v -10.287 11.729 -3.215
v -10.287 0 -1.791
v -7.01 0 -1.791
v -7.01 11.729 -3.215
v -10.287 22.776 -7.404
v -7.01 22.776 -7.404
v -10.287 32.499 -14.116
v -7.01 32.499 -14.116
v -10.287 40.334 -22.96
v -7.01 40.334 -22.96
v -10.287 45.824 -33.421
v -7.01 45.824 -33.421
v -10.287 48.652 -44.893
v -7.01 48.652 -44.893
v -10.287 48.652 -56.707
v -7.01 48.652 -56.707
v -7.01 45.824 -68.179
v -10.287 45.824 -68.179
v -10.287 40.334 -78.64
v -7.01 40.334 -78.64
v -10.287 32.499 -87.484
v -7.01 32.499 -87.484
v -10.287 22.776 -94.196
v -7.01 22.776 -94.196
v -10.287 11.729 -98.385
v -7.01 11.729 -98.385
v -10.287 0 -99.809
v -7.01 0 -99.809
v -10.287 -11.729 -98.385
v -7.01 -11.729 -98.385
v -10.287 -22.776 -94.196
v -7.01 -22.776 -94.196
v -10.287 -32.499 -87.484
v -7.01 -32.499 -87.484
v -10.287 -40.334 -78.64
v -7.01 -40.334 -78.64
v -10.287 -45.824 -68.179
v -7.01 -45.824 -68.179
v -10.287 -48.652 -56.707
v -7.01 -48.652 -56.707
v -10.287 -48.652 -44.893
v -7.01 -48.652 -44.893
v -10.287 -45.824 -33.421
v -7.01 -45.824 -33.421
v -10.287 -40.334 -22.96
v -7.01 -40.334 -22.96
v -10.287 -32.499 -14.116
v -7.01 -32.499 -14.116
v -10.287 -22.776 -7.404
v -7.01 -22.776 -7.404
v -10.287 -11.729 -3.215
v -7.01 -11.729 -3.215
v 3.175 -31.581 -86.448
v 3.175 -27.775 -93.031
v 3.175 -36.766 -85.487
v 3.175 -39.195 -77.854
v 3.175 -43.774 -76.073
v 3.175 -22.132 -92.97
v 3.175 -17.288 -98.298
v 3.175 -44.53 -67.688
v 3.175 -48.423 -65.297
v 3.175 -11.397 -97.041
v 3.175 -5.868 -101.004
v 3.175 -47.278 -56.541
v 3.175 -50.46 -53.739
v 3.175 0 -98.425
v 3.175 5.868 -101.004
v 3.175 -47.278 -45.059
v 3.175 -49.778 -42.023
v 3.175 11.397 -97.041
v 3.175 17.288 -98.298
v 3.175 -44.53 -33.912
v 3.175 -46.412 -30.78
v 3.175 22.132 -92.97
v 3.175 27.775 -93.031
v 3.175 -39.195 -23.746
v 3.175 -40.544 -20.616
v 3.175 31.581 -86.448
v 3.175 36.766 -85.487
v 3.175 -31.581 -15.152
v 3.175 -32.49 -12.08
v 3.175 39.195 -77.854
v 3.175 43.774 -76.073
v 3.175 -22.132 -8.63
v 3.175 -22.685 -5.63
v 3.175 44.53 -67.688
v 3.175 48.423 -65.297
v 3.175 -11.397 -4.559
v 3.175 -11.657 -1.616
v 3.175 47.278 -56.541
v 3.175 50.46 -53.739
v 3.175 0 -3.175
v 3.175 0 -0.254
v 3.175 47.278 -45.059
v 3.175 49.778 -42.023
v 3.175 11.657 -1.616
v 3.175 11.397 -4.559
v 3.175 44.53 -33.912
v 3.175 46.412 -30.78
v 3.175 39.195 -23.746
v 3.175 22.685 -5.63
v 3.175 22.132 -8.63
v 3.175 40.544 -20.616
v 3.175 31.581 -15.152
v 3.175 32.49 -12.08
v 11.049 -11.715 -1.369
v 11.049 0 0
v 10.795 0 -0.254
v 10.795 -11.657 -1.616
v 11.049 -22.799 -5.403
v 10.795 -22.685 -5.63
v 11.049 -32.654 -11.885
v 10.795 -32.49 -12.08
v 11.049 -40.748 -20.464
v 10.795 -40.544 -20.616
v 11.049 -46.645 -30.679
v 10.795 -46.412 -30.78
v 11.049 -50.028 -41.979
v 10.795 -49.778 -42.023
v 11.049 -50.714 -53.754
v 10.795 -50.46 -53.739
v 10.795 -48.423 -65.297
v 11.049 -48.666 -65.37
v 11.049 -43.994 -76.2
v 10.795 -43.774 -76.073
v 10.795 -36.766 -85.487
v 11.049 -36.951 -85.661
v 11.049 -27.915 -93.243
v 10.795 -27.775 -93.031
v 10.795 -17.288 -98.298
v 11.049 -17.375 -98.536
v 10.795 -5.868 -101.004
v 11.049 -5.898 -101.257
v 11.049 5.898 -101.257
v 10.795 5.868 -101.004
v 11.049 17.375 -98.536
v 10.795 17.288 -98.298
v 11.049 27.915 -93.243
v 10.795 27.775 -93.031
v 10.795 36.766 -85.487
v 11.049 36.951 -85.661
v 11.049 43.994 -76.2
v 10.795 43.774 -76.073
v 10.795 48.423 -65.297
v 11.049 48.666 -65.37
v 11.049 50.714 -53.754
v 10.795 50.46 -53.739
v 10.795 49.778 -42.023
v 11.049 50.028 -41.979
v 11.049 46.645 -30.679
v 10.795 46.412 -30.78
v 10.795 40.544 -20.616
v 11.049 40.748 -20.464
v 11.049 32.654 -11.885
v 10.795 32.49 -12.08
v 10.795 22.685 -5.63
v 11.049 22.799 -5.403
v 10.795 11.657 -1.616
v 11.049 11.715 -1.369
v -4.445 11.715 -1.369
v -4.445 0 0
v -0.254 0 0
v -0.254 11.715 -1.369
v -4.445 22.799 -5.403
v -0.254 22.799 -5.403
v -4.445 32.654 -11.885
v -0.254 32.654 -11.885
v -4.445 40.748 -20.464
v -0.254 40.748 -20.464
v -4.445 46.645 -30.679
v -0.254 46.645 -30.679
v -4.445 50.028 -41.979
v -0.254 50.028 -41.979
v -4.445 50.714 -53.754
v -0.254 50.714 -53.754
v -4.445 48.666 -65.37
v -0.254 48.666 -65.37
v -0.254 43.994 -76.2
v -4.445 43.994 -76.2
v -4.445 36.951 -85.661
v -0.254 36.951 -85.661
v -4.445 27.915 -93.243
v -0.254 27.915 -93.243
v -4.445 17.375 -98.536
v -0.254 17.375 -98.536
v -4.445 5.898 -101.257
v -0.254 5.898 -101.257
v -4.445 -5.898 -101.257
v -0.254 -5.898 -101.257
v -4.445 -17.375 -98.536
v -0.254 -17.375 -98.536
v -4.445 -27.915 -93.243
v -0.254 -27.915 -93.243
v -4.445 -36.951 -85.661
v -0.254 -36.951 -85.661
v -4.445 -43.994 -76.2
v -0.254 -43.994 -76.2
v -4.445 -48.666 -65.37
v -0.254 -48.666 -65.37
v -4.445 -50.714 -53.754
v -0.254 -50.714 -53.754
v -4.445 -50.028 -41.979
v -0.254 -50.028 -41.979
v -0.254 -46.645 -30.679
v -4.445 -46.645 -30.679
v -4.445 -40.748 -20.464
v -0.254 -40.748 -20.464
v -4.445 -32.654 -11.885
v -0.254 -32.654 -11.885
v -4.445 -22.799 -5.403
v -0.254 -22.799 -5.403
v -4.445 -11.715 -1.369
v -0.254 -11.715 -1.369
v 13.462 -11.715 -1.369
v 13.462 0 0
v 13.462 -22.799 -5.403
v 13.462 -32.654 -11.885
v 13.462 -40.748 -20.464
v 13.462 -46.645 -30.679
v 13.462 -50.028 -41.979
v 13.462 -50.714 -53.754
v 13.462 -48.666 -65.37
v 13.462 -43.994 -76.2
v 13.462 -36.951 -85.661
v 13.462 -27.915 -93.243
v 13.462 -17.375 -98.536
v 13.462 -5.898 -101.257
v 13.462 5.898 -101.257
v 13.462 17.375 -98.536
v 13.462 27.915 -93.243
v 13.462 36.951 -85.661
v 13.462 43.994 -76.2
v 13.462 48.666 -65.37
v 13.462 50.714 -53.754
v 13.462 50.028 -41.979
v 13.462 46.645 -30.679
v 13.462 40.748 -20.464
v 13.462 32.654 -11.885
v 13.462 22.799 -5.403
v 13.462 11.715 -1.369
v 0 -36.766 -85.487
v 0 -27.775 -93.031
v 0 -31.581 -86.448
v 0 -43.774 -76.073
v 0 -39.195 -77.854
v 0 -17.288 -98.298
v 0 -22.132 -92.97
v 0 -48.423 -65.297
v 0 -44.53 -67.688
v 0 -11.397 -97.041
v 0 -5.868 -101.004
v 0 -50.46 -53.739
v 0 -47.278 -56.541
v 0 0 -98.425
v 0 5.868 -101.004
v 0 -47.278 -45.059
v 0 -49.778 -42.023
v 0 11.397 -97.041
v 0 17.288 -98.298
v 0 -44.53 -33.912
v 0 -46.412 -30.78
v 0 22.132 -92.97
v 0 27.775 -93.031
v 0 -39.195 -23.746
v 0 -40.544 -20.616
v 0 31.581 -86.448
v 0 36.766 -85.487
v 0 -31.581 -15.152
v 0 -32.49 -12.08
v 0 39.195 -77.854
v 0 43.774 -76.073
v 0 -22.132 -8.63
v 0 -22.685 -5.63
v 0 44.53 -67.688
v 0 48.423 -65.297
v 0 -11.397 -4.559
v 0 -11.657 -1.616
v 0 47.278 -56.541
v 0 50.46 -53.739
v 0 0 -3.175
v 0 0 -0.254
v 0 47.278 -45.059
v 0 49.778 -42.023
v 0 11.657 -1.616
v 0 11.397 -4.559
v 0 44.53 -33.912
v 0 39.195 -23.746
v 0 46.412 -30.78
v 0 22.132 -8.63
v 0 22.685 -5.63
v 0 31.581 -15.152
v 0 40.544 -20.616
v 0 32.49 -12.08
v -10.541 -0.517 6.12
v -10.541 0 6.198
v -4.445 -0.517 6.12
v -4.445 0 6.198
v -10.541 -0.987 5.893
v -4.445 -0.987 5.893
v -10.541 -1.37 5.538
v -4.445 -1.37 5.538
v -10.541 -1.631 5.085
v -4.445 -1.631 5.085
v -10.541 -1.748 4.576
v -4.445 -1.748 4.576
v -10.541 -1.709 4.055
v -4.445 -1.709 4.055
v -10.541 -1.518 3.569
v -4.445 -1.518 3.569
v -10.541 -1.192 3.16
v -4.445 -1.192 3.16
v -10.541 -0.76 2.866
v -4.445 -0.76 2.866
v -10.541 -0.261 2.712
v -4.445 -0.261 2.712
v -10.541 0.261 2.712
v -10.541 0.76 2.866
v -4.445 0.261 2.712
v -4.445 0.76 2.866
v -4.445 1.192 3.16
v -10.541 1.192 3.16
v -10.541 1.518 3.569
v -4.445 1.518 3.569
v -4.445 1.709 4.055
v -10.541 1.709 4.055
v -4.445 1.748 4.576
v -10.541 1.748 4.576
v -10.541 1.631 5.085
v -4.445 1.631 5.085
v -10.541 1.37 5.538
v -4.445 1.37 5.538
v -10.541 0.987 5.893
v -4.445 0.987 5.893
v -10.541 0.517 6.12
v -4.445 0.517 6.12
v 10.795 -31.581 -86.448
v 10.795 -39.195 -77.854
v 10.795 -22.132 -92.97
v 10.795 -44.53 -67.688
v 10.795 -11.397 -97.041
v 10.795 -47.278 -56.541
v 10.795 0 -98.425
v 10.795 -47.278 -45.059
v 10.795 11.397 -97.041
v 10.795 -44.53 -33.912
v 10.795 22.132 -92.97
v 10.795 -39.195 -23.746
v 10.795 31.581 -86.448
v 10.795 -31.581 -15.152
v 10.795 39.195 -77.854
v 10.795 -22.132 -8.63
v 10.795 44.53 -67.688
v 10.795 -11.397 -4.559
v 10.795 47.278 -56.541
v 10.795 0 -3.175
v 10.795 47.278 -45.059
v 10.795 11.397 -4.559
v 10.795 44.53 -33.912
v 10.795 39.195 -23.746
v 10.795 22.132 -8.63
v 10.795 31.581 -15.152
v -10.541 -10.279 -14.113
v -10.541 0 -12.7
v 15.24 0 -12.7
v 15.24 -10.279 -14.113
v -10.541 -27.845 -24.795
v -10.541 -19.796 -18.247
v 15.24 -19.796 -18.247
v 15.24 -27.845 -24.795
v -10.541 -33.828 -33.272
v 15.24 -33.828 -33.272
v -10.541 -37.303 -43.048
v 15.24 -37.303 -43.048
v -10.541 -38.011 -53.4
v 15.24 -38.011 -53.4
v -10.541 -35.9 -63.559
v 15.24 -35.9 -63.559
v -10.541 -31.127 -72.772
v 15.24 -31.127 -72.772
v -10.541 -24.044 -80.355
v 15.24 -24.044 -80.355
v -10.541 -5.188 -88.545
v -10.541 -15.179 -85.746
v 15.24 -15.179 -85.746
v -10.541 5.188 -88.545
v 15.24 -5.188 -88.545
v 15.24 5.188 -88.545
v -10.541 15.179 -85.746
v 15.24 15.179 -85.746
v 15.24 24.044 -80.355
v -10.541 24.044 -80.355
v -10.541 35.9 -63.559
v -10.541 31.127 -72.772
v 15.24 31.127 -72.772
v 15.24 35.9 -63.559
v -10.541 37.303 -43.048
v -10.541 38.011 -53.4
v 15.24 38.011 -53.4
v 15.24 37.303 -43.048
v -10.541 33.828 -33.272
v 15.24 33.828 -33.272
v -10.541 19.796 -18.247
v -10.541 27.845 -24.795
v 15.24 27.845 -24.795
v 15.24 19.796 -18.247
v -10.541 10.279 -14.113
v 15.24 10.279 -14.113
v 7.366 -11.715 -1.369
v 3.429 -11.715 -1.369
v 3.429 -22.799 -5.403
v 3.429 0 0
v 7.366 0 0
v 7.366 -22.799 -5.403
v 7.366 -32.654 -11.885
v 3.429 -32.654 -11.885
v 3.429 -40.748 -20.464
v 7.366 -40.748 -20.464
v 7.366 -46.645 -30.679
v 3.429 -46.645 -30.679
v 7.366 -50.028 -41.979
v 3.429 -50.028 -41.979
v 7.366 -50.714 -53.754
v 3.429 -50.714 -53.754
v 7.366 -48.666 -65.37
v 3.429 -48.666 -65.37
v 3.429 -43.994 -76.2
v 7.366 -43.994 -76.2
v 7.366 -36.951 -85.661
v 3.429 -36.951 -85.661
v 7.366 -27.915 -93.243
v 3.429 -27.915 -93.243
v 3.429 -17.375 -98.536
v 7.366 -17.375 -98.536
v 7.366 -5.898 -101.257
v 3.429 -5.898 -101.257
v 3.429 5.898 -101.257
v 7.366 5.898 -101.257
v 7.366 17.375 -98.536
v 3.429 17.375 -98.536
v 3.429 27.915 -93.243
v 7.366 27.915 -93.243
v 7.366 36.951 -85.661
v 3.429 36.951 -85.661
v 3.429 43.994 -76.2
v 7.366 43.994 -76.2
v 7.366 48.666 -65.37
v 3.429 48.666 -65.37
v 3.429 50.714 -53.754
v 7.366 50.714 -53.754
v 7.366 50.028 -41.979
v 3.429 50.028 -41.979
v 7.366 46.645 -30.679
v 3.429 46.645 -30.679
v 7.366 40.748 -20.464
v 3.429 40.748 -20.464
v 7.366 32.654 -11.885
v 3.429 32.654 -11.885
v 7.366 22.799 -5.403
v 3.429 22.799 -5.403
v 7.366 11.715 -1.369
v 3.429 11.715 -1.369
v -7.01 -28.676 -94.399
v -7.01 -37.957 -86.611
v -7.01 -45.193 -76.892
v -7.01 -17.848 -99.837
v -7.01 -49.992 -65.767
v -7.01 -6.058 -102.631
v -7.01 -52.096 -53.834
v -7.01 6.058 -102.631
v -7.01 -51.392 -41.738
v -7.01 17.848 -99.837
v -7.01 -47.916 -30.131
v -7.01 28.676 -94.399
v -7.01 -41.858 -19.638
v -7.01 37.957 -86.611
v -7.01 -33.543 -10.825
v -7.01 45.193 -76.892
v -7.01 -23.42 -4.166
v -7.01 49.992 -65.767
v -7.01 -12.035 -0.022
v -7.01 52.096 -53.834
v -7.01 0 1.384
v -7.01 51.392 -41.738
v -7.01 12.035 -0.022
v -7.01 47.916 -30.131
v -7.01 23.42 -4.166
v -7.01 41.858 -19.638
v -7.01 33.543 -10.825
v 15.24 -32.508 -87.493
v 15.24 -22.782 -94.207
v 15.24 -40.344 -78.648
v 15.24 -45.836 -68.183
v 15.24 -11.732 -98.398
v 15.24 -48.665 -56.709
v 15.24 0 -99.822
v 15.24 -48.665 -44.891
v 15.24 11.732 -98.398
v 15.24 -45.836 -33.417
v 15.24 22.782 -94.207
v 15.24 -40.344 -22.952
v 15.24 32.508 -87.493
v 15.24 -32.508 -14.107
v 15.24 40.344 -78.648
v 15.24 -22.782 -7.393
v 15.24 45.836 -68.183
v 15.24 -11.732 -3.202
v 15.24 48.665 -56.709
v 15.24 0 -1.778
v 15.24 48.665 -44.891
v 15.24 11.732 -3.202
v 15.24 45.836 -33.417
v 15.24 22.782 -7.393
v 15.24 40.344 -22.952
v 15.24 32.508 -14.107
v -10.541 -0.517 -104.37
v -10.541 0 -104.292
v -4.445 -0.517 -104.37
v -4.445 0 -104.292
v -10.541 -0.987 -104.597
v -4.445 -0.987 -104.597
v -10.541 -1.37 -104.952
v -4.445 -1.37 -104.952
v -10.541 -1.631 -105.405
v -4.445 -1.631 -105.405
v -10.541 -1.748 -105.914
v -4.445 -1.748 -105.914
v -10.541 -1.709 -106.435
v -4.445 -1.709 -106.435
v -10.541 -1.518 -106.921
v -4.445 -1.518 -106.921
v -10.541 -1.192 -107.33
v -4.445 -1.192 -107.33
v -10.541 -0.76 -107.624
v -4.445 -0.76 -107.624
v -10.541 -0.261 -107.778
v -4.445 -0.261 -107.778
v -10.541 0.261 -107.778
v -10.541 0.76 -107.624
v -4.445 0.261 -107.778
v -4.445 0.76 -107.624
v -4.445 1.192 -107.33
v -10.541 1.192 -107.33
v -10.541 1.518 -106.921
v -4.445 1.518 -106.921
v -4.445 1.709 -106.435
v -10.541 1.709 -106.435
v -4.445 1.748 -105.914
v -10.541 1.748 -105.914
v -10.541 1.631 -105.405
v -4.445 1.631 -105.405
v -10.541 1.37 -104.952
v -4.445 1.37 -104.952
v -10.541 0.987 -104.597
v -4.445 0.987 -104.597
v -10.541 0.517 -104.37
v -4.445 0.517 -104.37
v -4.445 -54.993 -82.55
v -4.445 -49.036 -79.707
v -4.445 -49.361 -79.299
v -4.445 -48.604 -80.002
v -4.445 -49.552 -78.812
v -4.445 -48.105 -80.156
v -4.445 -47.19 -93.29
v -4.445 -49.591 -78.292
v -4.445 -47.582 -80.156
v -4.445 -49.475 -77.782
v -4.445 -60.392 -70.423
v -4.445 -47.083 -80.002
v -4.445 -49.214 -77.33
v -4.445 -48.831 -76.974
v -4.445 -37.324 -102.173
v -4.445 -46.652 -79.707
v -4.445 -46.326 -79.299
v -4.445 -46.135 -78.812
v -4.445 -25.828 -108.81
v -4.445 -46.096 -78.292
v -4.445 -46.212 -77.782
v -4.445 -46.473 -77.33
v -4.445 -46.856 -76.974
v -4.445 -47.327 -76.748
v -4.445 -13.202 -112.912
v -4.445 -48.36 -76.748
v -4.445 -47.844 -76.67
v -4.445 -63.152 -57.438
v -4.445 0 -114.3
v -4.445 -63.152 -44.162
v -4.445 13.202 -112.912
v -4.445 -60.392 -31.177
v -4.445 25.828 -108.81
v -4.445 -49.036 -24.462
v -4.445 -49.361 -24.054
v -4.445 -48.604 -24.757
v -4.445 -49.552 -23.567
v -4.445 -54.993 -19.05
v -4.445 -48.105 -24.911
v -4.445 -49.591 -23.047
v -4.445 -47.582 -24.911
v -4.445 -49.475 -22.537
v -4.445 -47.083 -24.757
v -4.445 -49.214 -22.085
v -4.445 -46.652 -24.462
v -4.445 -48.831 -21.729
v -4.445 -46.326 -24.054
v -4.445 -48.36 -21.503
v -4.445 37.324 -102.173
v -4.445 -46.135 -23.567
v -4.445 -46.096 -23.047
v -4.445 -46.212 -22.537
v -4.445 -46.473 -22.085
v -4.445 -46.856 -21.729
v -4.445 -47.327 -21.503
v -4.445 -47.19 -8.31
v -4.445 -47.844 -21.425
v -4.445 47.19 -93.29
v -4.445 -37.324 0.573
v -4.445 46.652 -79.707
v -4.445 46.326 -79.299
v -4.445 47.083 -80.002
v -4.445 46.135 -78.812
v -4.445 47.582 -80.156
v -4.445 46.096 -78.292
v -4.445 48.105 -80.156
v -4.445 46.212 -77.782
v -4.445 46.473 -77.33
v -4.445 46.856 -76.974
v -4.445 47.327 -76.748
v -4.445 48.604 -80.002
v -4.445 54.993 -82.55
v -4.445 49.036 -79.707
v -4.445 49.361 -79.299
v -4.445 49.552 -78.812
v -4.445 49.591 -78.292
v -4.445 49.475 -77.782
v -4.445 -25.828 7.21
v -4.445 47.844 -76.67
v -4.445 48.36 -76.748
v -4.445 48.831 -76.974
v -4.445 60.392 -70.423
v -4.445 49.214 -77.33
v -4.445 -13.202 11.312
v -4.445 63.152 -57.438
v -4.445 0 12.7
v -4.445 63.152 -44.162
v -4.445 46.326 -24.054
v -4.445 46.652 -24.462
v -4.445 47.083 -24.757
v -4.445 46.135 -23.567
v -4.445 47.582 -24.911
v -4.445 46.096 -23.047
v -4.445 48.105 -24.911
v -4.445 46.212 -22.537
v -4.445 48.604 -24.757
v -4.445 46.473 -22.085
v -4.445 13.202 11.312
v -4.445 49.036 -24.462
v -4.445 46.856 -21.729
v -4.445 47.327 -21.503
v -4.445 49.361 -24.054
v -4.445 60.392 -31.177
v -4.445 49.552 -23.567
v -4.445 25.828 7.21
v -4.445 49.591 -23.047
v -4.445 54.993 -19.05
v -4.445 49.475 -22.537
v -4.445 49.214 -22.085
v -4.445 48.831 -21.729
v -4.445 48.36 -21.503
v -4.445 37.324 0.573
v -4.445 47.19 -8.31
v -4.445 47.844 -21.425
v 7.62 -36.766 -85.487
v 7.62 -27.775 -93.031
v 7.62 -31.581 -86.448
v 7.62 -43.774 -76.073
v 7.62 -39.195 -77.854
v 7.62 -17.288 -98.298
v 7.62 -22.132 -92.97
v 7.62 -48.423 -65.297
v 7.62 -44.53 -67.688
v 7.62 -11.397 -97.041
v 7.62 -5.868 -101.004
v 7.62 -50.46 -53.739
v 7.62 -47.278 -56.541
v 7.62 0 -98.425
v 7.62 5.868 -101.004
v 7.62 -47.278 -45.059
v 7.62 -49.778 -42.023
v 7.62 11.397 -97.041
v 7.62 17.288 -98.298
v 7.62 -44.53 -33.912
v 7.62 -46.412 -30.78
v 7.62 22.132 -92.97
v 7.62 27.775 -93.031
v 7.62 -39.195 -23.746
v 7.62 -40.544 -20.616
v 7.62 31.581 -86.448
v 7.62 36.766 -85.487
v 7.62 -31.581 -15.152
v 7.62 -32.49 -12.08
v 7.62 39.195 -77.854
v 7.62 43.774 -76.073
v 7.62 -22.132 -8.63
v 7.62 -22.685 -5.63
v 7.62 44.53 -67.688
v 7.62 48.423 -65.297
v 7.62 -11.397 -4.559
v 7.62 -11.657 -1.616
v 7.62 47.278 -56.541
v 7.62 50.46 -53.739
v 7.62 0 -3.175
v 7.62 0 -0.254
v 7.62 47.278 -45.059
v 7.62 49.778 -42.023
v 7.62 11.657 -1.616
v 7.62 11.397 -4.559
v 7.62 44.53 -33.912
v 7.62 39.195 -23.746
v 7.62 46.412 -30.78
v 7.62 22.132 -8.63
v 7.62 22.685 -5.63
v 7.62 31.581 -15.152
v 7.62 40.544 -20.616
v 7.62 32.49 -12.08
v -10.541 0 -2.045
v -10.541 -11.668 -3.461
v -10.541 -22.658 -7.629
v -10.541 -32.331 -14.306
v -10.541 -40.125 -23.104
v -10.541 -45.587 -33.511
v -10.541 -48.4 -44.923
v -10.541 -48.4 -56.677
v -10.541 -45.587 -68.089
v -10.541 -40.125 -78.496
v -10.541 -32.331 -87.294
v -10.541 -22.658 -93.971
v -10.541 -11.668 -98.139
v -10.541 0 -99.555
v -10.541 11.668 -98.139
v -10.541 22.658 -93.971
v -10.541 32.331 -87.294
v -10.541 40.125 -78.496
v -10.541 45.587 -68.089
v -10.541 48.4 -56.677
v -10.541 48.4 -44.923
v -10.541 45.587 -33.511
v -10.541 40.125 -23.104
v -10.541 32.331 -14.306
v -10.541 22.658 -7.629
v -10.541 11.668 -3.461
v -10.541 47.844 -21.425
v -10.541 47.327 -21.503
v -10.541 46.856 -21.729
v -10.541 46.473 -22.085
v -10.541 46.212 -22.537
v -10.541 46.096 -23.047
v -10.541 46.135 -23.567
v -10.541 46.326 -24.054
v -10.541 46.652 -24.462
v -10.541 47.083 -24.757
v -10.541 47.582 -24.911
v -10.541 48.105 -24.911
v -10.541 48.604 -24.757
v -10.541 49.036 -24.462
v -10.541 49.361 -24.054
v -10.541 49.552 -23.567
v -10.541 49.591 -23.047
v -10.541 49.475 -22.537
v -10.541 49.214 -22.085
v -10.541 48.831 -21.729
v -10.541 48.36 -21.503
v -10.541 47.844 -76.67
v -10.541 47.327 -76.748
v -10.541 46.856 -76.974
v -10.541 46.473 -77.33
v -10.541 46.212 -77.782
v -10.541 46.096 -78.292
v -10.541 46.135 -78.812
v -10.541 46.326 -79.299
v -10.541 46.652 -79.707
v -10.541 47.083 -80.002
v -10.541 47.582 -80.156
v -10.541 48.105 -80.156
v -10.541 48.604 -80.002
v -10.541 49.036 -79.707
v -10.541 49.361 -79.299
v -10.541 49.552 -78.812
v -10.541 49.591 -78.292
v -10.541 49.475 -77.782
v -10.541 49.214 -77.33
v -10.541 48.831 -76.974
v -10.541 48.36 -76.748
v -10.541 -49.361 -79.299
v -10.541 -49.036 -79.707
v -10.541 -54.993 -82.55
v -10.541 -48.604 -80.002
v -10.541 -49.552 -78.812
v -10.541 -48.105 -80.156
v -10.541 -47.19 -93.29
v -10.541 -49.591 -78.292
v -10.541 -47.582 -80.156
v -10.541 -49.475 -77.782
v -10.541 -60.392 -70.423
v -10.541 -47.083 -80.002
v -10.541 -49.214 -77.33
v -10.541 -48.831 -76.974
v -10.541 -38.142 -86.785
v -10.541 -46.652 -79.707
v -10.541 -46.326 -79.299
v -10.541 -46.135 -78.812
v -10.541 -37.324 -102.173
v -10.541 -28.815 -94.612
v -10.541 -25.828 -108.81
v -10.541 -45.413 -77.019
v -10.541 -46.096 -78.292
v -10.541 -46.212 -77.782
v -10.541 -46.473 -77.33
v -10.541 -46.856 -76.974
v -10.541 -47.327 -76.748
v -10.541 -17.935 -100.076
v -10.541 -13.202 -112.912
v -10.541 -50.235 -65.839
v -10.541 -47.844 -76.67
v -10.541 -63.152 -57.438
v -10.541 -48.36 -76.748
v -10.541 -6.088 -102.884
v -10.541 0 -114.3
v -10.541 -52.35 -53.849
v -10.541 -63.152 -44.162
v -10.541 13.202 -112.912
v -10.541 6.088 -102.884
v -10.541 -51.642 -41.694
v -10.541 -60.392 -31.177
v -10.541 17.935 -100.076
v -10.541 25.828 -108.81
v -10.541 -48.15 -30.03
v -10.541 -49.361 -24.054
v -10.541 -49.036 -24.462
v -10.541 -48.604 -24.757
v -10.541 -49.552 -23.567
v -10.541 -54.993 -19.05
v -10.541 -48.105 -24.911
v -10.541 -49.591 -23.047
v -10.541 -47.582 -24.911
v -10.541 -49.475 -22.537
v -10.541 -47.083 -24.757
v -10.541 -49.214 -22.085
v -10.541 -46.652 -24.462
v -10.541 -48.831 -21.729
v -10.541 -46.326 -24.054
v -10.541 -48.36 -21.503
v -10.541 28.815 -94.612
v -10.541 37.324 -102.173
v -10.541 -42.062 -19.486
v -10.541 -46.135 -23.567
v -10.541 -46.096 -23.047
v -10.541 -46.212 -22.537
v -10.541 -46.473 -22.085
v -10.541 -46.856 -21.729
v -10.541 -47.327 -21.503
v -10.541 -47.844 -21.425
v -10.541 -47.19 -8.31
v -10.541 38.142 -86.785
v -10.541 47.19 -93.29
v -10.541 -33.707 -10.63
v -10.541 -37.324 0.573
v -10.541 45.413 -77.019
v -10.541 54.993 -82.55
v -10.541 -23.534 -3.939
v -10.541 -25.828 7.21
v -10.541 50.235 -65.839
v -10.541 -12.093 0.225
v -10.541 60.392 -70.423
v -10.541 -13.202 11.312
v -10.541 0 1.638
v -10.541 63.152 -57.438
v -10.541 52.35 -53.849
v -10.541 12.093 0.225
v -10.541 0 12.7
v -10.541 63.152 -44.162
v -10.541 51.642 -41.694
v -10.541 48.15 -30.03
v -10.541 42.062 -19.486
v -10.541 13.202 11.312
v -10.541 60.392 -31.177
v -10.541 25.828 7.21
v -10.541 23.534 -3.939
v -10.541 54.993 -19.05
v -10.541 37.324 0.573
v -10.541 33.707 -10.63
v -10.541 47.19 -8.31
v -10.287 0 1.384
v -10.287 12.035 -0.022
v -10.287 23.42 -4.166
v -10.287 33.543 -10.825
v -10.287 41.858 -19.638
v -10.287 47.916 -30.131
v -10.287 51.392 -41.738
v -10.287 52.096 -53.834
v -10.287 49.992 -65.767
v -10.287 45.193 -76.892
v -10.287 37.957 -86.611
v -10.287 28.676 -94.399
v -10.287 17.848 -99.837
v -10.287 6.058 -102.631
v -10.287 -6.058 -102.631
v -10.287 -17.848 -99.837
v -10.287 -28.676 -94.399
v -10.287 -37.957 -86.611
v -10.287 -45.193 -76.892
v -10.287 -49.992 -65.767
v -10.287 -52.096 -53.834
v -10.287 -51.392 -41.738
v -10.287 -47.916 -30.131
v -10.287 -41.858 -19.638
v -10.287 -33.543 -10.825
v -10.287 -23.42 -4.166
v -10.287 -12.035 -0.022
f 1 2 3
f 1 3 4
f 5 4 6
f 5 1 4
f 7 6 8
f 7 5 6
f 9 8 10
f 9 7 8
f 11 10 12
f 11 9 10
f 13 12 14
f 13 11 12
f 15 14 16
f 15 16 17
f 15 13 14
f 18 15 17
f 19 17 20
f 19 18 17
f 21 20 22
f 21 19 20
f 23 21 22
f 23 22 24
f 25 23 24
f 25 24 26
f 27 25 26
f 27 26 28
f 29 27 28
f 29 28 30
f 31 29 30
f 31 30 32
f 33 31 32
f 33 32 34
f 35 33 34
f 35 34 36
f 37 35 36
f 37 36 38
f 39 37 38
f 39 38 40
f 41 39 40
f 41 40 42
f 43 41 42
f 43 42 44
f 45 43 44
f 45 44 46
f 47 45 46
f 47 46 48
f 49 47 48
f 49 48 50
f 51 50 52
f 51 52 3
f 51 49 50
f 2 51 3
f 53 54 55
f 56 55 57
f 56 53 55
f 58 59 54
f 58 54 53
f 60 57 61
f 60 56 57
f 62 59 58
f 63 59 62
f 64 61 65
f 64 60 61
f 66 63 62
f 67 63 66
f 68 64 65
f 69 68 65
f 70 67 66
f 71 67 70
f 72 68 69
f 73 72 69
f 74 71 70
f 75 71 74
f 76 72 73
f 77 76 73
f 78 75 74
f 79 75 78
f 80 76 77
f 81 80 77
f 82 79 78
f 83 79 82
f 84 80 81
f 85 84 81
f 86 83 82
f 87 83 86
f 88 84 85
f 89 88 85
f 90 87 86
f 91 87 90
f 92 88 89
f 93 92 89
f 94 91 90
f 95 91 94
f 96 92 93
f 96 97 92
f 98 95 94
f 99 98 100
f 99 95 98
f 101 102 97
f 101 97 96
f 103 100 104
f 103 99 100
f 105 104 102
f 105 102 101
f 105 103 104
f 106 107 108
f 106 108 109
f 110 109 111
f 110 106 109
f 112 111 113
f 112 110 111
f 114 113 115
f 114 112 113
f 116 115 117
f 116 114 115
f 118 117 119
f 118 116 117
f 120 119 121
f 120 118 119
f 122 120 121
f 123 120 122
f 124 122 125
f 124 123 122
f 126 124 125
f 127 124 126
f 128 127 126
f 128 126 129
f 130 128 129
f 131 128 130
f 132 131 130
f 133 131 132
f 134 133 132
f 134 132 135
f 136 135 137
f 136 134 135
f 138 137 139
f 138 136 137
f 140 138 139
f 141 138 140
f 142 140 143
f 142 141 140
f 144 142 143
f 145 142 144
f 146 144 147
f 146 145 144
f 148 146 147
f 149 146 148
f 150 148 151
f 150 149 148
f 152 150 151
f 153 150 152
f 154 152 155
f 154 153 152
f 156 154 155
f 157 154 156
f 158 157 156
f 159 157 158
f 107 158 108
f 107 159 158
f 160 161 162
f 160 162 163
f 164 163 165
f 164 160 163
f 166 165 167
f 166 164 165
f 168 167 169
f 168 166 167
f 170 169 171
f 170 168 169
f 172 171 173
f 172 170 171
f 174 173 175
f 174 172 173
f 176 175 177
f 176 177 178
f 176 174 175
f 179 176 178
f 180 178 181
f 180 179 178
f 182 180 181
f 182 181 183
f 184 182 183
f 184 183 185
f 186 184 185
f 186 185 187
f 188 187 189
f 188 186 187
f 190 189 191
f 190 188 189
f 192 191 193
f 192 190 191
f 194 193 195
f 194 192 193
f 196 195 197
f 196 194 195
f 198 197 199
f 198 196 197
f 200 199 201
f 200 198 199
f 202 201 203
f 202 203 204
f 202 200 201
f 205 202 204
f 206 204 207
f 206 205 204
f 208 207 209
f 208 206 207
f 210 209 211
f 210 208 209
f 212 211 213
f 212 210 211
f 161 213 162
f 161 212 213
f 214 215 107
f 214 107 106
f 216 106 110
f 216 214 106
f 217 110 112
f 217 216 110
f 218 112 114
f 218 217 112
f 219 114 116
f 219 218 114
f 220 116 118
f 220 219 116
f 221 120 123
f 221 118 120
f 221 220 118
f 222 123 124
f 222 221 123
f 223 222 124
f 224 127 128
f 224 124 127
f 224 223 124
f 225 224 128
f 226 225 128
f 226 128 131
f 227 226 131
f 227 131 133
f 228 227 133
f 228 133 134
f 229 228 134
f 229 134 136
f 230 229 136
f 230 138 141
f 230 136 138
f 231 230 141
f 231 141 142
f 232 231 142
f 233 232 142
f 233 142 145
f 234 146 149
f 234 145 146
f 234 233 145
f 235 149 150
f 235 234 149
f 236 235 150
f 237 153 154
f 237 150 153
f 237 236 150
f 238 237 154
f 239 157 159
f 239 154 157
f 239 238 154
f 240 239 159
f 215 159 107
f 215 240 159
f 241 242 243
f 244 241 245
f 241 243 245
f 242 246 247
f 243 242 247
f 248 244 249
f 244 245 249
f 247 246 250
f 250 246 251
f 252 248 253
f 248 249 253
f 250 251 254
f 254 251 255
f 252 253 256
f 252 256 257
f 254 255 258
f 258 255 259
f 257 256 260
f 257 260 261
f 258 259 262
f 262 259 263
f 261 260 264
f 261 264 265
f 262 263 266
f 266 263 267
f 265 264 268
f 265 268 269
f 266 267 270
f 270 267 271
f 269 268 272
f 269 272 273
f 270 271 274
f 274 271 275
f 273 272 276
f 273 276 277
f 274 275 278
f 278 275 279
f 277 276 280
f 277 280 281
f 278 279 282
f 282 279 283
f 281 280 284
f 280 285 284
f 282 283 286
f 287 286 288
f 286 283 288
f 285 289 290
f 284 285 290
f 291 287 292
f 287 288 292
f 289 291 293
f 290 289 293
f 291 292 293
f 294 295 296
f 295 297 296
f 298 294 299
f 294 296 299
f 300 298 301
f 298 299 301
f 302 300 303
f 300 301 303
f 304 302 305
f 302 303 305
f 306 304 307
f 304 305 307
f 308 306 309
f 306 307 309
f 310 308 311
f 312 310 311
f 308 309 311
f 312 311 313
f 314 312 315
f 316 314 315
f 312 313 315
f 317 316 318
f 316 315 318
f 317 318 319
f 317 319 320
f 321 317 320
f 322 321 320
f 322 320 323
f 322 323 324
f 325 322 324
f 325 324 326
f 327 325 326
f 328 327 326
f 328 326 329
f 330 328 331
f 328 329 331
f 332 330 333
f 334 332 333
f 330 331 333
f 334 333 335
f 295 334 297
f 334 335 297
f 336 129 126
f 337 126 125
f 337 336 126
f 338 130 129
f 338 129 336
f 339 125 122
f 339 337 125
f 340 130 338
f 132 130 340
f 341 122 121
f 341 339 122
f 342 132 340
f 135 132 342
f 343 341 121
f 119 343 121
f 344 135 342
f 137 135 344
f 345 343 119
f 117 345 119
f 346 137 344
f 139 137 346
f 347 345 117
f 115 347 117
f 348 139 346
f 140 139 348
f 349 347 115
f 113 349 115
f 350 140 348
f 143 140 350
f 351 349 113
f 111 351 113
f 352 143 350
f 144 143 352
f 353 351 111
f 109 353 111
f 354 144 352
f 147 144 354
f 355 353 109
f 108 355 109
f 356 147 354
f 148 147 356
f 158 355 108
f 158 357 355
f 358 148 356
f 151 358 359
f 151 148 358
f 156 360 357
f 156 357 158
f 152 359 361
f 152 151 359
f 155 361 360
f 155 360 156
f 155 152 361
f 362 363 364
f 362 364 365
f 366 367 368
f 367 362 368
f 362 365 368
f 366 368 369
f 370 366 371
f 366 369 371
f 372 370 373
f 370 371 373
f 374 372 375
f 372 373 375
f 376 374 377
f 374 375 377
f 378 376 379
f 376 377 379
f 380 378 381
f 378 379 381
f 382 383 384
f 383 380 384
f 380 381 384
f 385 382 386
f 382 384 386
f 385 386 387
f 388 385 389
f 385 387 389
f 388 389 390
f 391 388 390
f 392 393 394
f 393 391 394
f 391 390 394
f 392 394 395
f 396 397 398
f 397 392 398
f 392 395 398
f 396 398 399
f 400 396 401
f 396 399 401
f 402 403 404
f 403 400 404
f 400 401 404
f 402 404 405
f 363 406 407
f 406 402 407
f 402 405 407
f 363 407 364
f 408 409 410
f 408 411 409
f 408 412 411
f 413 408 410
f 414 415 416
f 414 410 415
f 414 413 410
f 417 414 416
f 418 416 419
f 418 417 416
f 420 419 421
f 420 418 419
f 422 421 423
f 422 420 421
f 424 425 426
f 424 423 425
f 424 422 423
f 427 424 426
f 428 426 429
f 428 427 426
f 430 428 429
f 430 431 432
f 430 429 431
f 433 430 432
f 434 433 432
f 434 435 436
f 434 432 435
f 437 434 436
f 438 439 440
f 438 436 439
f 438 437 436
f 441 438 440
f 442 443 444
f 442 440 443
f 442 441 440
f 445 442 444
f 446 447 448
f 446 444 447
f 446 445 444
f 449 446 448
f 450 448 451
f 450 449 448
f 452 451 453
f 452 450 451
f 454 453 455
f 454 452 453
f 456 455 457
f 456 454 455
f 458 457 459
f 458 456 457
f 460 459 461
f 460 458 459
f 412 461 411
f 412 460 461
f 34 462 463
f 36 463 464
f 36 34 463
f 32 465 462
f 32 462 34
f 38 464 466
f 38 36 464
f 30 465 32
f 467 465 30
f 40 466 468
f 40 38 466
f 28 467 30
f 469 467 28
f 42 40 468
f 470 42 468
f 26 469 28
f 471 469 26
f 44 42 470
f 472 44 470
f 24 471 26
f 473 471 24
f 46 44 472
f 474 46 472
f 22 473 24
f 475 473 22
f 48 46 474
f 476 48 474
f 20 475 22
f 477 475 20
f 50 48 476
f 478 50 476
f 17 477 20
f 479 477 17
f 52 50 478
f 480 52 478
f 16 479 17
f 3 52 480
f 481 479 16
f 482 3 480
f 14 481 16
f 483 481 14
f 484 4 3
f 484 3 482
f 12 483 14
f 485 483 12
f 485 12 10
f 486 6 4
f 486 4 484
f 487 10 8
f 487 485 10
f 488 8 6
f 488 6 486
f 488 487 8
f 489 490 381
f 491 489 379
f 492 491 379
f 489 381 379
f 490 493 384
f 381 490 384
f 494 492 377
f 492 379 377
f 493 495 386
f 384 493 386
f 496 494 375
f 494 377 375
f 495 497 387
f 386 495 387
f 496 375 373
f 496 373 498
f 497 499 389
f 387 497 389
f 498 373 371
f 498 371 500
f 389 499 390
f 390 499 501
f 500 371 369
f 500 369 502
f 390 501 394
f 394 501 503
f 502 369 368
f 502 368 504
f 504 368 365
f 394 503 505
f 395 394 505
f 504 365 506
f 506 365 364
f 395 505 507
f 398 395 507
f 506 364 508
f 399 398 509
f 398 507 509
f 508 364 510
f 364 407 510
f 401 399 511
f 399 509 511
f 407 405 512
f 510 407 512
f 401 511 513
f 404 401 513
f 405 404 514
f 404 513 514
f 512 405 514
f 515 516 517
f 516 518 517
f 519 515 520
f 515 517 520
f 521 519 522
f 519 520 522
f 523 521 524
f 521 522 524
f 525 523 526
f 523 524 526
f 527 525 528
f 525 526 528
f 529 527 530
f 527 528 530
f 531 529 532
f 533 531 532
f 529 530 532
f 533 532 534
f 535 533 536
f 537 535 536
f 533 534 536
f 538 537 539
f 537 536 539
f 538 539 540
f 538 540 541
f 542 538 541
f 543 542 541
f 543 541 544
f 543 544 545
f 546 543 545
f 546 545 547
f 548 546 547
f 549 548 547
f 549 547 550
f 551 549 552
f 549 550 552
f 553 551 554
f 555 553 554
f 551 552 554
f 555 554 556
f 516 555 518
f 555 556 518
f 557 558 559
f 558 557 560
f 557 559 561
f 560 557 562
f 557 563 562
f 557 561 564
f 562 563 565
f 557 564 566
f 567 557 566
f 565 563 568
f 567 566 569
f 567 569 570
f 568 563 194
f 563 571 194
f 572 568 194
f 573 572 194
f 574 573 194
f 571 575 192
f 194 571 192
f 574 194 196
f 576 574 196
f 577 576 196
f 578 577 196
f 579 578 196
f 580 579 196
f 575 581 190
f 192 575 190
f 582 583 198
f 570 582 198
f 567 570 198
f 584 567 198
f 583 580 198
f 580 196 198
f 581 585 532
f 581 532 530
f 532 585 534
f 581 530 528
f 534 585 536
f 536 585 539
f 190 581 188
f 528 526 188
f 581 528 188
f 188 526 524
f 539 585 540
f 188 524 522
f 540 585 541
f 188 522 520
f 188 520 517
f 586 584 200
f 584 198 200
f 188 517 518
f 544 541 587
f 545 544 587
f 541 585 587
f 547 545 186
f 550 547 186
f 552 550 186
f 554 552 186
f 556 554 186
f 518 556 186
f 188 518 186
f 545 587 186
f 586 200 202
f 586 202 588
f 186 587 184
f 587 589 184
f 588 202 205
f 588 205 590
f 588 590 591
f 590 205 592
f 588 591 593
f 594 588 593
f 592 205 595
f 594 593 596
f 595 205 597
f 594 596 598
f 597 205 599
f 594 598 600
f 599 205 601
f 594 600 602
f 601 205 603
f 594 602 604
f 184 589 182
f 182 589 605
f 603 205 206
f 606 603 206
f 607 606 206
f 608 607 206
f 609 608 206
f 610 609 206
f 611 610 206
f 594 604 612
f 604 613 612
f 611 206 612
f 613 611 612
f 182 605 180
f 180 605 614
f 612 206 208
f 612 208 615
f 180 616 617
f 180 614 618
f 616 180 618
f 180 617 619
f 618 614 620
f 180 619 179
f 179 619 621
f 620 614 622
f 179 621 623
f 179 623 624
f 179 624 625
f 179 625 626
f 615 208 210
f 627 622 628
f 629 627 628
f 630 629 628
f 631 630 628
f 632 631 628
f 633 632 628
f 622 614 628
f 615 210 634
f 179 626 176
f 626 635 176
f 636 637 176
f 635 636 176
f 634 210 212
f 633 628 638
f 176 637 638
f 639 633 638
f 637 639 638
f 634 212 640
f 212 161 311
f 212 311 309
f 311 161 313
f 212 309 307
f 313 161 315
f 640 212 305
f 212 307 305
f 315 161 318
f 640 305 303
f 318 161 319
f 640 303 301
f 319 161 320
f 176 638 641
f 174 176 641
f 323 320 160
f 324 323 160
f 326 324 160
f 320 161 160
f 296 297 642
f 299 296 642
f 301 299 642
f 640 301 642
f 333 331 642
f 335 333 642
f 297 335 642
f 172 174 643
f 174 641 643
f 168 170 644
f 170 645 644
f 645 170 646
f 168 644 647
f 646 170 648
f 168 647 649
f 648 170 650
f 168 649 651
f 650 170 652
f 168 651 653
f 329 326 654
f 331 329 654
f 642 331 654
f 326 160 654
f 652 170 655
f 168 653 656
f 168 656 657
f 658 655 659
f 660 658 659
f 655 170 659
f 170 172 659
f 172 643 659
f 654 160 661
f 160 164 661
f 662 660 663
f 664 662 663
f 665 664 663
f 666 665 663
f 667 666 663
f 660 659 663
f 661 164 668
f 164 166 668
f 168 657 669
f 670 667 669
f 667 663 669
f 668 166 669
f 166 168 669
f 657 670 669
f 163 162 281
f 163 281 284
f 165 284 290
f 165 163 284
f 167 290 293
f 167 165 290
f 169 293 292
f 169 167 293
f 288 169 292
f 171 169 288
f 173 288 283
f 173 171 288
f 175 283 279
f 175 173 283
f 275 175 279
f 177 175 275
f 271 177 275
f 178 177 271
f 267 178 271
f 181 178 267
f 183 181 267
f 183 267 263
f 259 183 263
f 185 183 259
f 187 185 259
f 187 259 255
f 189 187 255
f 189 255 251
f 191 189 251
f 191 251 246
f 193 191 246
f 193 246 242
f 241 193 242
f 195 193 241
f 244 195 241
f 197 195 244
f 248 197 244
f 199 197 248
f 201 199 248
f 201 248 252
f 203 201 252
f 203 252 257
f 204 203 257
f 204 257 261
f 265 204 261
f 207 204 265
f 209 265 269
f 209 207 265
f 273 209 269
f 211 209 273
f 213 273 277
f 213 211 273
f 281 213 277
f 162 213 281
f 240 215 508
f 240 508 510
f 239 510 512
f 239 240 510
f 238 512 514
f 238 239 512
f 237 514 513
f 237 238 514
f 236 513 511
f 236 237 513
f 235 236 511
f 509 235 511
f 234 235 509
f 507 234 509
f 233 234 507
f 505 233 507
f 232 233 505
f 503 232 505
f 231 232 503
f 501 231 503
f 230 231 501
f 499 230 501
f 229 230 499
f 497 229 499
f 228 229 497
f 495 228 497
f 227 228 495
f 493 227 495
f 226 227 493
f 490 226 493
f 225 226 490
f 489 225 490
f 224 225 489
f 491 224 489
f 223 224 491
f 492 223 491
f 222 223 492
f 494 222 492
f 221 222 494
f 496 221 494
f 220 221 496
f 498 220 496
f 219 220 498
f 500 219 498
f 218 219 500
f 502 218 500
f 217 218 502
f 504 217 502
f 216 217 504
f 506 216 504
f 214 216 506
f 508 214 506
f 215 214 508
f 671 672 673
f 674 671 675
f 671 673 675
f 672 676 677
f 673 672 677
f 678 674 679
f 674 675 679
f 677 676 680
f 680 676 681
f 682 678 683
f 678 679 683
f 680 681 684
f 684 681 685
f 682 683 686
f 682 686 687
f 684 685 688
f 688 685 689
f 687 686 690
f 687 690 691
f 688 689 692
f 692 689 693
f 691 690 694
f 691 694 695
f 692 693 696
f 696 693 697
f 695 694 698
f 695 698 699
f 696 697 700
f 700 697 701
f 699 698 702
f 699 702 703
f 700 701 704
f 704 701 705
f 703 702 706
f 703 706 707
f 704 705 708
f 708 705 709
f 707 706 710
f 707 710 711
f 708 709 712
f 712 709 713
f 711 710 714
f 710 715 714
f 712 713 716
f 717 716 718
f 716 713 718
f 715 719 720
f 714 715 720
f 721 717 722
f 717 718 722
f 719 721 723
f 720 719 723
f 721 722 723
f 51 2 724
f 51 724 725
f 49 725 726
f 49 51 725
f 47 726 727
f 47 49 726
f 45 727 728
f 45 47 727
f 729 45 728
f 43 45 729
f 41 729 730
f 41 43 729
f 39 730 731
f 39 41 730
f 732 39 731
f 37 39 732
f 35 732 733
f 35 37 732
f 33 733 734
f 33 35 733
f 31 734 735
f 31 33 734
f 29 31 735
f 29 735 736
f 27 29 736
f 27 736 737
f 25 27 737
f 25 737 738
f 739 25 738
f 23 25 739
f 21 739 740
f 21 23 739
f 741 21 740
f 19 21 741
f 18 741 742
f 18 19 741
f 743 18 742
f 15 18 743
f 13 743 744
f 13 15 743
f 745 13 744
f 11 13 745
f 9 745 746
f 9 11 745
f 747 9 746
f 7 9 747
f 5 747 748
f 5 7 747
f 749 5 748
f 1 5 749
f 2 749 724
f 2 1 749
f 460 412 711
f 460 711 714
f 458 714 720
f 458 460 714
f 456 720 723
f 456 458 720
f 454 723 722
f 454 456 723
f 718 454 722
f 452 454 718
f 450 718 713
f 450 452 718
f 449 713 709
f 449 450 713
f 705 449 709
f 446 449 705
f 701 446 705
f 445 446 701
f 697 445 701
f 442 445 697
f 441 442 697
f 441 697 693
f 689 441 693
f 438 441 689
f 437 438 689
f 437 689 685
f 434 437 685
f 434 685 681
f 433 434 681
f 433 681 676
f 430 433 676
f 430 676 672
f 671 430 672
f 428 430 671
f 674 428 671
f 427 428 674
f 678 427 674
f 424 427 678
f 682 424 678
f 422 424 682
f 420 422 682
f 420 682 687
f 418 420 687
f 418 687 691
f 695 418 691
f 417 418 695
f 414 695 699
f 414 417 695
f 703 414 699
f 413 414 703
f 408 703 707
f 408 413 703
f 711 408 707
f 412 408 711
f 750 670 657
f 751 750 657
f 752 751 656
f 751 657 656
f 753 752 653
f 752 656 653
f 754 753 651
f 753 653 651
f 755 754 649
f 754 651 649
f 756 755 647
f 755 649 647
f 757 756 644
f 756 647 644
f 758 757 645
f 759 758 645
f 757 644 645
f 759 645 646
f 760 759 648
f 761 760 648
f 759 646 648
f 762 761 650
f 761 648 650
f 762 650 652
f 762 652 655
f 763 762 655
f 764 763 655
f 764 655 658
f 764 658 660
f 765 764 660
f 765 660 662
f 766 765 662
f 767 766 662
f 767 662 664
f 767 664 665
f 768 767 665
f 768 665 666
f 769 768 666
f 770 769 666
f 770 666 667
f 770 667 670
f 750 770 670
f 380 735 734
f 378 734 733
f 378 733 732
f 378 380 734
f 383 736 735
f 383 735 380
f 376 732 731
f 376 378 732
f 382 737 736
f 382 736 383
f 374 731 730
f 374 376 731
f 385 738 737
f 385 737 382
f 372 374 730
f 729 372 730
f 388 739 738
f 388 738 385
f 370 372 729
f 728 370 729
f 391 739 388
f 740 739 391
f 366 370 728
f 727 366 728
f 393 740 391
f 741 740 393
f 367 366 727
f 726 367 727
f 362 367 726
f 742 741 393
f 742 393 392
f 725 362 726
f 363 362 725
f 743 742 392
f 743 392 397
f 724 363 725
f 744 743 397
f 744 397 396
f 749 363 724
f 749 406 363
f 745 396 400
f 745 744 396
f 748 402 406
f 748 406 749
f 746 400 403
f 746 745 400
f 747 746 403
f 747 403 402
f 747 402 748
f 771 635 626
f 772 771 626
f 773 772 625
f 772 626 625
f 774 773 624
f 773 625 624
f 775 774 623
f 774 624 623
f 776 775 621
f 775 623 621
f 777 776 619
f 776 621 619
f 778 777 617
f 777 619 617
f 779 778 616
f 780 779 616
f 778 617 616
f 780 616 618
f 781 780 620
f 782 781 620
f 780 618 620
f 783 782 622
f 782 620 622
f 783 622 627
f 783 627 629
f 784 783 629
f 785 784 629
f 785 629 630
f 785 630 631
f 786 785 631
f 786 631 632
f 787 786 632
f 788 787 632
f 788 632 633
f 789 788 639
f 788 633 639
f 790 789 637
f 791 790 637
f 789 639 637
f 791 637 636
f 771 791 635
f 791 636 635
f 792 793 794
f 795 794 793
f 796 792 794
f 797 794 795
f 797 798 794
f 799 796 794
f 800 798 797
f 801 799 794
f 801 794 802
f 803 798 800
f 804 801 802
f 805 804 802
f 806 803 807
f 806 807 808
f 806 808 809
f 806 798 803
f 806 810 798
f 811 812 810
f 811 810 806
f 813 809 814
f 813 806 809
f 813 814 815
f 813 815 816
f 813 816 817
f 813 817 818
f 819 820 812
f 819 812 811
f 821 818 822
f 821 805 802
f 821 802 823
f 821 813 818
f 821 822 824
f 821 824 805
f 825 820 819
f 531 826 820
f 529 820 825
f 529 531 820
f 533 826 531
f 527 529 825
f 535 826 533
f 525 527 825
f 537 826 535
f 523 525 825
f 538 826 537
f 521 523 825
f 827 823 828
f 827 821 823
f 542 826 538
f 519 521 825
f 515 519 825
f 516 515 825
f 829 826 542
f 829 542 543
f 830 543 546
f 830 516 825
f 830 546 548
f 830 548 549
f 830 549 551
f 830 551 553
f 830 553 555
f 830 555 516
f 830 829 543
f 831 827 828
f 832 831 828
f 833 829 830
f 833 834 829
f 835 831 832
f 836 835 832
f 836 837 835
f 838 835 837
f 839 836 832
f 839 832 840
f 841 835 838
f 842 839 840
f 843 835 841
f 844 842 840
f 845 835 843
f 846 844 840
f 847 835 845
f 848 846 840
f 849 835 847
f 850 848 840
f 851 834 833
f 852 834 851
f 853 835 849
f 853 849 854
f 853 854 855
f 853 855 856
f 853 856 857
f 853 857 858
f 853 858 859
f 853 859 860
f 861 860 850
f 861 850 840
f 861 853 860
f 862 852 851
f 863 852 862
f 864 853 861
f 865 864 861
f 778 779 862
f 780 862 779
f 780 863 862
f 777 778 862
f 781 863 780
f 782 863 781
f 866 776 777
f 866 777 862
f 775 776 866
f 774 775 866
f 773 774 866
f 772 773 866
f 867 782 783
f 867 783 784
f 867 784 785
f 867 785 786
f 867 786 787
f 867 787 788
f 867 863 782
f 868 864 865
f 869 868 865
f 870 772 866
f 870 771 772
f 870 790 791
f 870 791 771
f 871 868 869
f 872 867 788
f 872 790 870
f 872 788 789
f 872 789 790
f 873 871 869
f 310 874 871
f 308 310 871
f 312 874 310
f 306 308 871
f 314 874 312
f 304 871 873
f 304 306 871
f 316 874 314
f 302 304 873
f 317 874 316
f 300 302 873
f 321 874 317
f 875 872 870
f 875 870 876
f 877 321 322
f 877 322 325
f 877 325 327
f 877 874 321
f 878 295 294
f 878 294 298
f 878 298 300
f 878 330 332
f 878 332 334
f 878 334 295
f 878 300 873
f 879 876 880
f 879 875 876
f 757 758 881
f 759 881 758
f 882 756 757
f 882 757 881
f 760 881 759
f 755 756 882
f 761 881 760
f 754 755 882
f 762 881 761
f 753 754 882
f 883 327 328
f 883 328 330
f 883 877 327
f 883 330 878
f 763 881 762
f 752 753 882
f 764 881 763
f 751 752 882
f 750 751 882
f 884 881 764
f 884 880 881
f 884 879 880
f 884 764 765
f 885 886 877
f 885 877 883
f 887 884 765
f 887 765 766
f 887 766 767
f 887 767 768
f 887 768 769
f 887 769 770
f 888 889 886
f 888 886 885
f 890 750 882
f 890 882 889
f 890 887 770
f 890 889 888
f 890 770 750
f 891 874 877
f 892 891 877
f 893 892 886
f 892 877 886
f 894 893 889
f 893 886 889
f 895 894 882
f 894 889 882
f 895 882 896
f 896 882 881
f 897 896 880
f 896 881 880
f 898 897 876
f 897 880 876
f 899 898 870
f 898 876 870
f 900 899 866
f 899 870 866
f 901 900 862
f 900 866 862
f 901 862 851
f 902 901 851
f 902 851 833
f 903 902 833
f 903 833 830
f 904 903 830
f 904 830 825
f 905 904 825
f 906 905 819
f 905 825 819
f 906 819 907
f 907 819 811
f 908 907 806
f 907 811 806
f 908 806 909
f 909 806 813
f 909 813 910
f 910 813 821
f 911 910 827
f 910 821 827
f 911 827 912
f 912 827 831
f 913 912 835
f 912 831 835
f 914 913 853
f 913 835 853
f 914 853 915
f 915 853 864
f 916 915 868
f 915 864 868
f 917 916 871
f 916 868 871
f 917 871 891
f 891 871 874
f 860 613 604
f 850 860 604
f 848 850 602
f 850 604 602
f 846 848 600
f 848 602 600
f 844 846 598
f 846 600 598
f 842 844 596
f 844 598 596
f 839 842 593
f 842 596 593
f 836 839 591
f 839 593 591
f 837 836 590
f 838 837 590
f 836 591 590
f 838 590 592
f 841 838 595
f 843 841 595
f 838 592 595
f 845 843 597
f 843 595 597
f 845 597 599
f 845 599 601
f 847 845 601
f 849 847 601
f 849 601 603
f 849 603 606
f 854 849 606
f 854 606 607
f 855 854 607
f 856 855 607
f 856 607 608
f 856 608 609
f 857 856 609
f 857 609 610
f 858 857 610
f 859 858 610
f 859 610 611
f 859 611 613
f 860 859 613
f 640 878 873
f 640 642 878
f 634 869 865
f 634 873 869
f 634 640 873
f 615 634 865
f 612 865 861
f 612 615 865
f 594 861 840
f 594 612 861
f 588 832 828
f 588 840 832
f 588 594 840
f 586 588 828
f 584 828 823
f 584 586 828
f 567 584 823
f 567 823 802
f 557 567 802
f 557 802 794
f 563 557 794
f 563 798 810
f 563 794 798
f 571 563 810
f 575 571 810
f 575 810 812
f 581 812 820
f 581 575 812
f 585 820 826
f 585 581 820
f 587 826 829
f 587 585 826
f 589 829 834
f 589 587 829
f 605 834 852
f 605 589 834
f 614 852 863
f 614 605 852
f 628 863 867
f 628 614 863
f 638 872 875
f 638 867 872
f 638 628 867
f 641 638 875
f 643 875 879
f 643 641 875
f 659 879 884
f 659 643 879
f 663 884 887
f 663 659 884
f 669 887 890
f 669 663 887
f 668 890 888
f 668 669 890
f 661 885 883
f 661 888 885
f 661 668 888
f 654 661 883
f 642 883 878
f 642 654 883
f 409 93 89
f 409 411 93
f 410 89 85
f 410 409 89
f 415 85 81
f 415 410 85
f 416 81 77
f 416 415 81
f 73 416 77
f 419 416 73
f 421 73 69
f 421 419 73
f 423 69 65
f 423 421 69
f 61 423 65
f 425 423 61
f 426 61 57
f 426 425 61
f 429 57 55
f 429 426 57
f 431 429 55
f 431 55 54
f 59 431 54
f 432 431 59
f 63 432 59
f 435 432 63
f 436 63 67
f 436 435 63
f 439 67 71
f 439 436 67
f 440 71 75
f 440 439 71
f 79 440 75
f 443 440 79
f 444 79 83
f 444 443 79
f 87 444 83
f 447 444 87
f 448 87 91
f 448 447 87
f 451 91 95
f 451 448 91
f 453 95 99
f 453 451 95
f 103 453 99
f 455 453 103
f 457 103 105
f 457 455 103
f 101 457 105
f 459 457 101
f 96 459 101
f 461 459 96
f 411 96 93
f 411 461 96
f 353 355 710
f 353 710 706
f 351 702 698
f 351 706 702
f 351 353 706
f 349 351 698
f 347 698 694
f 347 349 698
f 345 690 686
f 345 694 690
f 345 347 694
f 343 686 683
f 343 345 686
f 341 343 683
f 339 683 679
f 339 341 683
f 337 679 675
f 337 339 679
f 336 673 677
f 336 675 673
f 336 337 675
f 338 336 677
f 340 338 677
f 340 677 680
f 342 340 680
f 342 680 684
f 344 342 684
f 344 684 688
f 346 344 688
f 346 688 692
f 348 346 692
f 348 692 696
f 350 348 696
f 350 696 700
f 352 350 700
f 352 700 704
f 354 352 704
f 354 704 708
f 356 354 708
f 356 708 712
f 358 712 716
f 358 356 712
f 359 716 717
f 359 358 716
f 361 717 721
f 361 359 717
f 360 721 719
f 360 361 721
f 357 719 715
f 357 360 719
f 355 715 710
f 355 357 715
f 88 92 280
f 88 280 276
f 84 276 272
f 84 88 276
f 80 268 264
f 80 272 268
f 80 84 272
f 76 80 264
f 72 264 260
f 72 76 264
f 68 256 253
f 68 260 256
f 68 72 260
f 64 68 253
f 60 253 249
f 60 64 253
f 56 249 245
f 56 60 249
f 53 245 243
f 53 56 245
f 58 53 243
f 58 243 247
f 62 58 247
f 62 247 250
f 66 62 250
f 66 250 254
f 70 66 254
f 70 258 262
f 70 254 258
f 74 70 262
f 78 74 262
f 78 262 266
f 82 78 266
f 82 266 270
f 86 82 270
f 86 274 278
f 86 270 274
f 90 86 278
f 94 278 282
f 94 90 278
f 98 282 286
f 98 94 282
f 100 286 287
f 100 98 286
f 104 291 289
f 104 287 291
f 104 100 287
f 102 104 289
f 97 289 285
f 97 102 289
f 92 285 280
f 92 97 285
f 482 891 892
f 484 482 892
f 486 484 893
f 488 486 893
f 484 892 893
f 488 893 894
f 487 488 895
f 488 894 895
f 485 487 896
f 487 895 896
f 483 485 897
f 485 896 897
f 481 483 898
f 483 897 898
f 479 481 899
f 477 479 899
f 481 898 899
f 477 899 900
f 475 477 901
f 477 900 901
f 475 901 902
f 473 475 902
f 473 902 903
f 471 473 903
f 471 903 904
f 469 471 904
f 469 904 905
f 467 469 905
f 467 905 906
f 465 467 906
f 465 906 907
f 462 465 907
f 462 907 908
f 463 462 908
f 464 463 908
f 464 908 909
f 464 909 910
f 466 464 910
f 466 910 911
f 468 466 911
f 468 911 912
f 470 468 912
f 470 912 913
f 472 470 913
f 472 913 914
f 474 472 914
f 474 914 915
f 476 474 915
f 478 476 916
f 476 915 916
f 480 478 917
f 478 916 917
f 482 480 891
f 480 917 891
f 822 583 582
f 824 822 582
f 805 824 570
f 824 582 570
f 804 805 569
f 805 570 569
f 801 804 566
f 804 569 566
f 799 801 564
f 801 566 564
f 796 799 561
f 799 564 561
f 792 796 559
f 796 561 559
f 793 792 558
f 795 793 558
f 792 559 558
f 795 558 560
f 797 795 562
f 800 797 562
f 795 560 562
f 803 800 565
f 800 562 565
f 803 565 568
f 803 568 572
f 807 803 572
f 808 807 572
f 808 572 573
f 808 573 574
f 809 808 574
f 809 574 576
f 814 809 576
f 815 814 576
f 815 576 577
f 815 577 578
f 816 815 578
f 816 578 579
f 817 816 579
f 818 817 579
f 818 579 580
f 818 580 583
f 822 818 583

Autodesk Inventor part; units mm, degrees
ref_plane "YZ Plane" through (0, 0, 0) normal (1, 0, 0) x (0, 1, 0)
ref_plane "XZ Plane" through (0, 0, 0) normal (0, 1, 0) x (-1, 0, 0)
ref_plane "XY Plane" through (0, 0, 0) normal (0, 0, 1) x (1, 0, 0)
sketch "Sketch1" plane through (0, 0, 0) normal (0, 1, 0) x (-1, 0, 0)
  line L0 (0, 0) -> (4.445, 0)
  line L1 (0, 0) -> (0, -3.175)
  line L2 (0, -3.175) -> (-3.175, -3.175)
  line L3 (-3.175, -3.175) -> (-3.175, 0)
  line L4 (-3.175, 0) -> (-7.62, 0)
  line L5 (-7.62, 0) -> (-7.62, -3.175)
  line L6 (-7.62, -3.175) -> (-10.795, -3.175)
  line L7 (-10.795, -3.175) -> (-10.795, 0)
  line L8 (-10.795, 0) -> (-15.24, 0)
  line L9 (-15.24, 0) -> (-15.24, -12.7)
  line L10 (-15.24, -12.7) -> (4.445, -12.7)
  line L11 (4.445, -12.7) -> (4.445, 0)
  line L12 (-15.24, 0) -> (-15.24, -50.8) construction
  line L13 (-15.24, -50.8) -> (-2.54, -50.8) construction
  dimension "d0" = 4.445
  dimension "d1" = 3.175
  dimension "d2" = 3.175
  dimension "d3" = 4.445
  dimension "d4" = 3.175
  dimension "d5" = 4.445
  dimension "d6" = 12.7
  dimension "d7" = 50.8
  dimension "d36" = 12.7
  dimension "d38" = 12.7
revolve "Revolution1" add sketch "Sketch1" angle 360 about axis through (15.24, 0, -50.8) along (-1, 0, 0)
sketch "Sketch2" plane through (-4.445, 0, -50.8) normal (-1, 0, 0) x (0, 0, 1)
  circle A0 centre (0, 0) radius 38.1
  circle A1 centre (0, 0) radius 63.5
  circle A2 centre (0, 0) radius 38.1 projected
  dimension "d9" = 76.2
  dimension "d10" = 127
extrude "Extrusion1" add sketch "Sketch2" along normal blind 6.096
sketch "Sketch3" plane through (-10.541, 0, -50.8) normal (-1, 0, 0) x (0, 0, 1)
  circle A0 centre (0, 0) radius 49.0093
  circle A1 centre (0, 0) radius 52.1843
  circle A2 centre (0, 0) radius 38.1 projected
  dimension "d41" = 10.9093
  dimension "d42" = 3.175
extrude "Extrusion2" cut sketch "Sketch3" against normal blind 3.5306 contours A1
chamfer "Chamfer1" distance 1.778 angle 45 1 edges at (15.24, 0, -101.6)
sketch "Sketch5" plane through (-10.541, 0, -50.8) normal (-1, 0, 0) x (0, 0, 1)
  circle A0 centre (0, 0) radius 55.245 construction
  circle A1 centre (0, 0) radius 38.1 projected
  point P0 (-55.245, 0)
  point P1 (-27.6225, -47.8436)
  point P2 (27.6225, -47.8436)
  point P3 (55.245, 0)
  point P4 (27.6225, 47.8436)
  point P5 (-27.6225, 47.8436)
  dimension "d43" = 110.49
  dimension "d46" = 360
hole "Hole1" at (-10.541, 0, -106.045) at (-10.541, -47.8436, -78.4225) at (-10.541, -47.8436, -23.1775) at (-10.541, 0, 4.445) at (-10.541, 47.8436, -23.1775) at (-10.541, 47.8436, -78.4225) direction (1, 0, 0) diameter 3.5052 end through all
chamfer "Chamfer2" distance 0.254 angle 45 6 edges at (0, 0, -101.6) (3.175, 0, -101.6) (7.62, 0, -101.6) (10.795, 0, -101.6) (-10.541, 0, -102.9843) (-10.541, 0, -99.8093)
properties part number "Oring Fitting Dome V3"
